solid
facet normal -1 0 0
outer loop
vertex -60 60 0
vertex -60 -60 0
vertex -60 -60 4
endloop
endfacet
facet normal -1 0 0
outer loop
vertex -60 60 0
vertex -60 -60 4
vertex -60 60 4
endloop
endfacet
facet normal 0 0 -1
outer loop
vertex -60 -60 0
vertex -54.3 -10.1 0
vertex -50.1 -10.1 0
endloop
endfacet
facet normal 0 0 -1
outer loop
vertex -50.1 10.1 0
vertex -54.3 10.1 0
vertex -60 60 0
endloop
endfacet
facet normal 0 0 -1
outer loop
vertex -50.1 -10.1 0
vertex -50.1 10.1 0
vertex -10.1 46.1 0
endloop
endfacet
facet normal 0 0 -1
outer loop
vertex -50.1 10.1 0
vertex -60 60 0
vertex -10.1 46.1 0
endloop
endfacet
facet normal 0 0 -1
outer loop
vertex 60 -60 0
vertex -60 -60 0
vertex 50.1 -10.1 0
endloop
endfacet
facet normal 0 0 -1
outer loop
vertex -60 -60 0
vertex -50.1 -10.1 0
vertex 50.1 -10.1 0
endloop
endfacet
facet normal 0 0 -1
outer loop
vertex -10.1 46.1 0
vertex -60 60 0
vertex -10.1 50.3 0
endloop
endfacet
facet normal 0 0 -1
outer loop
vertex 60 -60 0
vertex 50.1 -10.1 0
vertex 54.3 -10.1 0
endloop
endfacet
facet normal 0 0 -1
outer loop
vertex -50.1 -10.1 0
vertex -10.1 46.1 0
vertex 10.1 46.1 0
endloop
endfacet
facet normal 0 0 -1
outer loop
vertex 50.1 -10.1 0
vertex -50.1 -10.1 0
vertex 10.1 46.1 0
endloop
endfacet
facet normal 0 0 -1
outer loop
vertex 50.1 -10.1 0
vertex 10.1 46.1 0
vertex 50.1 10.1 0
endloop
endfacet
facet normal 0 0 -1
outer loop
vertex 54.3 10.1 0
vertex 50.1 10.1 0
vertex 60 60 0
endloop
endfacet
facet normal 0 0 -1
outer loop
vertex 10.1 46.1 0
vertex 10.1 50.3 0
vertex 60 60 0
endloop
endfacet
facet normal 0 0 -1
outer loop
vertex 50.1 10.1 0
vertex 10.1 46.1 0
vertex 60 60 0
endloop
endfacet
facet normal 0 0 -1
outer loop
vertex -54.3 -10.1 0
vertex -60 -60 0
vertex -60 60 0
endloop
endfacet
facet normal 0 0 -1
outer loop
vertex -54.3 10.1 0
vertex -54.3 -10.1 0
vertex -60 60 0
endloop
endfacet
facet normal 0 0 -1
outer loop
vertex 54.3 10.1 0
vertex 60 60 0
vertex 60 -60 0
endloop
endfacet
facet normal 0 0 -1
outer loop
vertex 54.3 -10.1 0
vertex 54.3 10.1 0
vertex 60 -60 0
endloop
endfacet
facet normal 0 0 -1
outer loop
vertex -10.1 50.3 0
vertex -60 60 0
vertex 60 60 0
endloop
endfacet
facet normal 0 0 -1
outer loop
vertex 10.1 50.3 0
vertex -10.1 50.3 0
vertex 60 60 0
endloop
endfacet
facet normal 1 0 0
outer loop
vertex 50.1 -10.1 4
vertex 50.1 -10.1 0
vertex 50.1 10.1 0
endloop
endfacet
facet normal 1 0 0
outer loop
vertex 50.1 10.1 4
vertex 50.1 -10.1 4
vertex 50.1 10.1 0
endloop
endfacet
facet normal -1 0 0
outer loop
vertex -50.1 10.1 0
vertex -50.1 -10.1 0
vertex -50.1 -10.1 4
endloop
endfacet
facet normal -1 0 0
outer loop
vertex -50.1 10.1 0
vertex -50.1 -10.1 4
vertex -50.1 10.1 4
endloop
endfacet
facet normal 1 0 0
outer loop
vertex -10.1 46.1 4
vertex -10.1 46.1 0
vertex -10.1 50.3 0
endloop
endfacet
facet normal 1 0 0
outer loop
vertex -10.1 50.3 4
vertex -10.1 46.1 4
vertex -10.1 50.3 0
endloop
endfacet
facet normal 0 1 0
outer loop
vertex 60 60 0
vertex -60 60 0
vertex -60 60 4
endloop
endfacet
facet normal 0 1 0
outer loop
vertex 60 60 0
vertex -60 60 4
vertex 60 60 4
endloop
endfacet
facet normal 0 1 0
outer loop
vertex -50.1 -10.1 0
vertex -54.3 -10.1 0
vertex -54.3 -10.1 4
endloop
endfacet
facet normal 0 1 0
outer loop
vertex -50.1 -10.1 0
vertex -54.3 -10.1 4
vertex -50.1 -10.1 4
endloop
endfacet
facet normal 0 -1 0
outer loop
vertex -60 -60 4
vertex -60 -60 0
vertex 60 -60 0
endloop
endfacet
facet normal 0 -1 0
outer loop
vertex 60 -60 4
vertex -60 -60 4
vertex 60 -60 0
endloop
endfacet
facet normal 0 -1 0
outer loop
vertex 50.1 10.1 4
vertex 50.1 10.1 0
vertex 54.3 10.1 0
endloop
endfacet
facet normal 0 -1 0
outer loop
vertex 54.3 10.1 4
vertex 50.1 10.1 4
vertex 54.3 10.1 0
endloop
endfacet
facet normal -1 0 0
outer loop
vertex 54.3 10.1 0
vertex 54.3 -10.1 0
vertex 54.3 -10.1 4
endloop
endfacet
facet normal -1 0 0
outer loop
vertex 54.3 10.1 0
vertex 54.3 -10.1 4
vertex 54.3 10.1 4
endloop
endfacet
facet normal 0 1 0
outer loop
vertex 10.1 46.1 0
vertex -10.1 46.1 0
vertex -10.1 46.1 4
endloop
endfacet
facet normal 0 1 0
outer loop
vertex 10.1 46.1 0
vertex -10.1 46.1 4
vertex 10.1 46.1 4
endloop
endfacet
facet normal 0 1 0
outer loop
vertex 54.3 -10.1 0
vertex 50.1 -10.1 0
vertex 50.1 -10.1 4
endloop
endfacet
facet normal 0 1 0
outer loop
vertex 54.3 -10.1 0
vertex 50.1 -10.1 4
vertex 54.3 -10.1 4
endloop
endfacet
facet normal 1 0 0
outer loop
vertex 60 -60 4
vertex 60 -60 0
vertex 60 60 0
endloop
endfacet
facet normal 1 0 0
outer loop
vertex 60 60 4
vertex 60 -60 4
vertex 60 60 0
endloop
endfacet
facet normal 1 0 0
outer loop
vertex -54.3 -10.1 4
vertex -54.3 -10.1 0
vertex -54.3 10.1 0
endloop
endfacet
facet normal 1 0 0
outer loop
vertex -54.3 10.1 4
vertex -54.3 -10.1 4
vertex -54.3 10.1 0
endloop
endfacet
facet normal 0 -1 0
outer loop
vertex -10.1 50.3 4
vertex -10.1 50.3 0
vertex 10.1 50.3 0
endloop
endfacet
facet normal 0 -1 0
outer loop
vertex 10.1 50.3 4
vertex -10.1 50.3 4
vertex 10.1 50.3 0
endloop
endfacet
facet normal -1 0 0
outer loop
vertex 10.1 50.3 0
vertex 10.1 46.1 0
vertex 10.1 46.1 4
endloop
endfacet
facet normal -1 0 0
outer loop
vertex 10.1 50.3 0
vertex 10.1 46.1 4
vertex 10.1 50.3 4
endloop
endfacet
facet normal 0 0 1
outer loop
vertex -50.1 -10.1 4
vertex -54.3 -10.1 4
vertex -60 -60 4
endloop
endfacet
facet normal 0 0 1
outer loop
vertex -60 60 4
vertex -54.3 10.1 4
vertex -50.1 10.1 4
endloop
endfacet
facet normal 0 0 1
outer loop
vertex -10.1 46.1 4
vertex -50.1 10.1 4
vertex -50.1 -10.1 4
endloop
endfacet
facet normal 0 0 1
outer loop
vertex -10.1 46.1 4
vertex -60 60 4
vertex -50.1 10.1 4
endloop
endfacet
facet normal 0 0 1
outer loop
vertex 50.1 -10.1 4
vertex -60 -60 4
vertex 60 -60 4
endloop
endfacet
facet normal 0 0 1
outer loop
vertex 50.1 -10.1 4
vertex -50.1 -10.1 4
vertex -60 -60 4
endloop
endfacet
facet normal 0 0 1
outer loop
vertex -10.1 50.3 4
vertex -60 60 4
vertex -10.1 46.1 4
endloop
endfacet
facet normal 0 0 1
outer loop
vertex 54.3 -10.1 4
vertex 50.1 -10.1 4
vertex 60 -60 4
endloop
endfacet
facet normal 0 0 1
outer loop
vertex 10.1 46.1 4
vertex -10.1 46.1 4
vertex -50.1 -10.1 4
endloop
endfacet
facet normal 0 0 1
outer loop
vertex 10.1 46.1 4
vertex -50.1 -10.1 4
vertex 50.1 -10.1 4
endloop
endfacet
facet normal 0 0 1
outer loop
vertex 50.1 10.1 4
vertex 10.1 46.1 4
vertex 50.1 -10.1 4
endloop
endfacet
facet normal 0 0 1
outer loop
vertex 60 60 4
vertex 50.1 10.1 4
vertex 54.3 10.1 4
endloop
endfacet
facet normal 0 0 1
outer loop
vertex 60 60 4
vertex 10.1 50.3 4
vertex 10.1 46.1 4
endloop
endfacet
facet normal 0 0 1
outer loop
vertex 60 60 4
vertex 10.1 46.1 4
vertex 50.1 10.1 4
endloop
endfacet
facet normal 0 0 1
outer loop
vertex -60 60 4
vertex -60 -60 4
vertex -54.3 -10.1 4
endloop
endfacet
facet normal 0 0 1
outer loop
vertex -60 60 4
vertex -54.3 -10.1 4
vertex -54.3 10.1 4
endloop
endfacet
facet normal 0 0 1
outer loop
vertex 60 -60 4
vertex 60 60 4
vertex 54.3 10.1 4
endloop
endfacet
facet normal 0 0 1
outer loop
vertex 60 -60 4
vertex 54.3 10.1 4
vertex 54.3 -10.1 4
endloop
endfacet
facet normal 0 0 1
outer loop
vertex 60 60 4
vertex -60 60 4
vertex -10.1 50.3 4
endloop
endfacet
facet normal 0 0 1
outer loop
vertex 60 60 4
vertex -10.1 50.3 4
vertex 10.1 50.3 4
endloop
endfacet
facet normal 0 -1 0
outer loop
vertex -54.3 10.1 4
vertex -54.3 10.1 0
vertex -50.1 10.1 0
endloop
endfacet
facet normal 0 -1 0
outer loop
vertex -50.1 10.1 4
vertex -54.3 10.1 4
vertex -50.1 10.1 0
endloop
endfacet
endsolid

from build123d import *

# Parameters (mm, degrees)
F0_W     = 120
F0_H     = 120
F0_W_2   = 4.2
F0_H_2   = 20.2
F0_W_3   = 20.2
F0_H_3   = 4.2
F1_DEPTH = 4


with BuildPart() as f1:
    # F0 (on Top) → F1 (new body)
    with BuildSketch(Plane.XY):
        Rectangle(F0_W, F0_H)
        with Locations((-52.2, 0)):
            Rectangle(F0_W_2, F0_H_2, mode=Mode.SUBTRACT)
        with Locations((52.2, 0)):
            Rectangle(F0_W_2, F0_H_2, mode=Mode.SUBTRACT)
        with Locations((0, 48.2)):
            Rectangle(F0_W_3, F0_H_3, mode=Mode.SUBTRACT)
    extrude(amount=F1_DEPTH)


solid = f1.part
